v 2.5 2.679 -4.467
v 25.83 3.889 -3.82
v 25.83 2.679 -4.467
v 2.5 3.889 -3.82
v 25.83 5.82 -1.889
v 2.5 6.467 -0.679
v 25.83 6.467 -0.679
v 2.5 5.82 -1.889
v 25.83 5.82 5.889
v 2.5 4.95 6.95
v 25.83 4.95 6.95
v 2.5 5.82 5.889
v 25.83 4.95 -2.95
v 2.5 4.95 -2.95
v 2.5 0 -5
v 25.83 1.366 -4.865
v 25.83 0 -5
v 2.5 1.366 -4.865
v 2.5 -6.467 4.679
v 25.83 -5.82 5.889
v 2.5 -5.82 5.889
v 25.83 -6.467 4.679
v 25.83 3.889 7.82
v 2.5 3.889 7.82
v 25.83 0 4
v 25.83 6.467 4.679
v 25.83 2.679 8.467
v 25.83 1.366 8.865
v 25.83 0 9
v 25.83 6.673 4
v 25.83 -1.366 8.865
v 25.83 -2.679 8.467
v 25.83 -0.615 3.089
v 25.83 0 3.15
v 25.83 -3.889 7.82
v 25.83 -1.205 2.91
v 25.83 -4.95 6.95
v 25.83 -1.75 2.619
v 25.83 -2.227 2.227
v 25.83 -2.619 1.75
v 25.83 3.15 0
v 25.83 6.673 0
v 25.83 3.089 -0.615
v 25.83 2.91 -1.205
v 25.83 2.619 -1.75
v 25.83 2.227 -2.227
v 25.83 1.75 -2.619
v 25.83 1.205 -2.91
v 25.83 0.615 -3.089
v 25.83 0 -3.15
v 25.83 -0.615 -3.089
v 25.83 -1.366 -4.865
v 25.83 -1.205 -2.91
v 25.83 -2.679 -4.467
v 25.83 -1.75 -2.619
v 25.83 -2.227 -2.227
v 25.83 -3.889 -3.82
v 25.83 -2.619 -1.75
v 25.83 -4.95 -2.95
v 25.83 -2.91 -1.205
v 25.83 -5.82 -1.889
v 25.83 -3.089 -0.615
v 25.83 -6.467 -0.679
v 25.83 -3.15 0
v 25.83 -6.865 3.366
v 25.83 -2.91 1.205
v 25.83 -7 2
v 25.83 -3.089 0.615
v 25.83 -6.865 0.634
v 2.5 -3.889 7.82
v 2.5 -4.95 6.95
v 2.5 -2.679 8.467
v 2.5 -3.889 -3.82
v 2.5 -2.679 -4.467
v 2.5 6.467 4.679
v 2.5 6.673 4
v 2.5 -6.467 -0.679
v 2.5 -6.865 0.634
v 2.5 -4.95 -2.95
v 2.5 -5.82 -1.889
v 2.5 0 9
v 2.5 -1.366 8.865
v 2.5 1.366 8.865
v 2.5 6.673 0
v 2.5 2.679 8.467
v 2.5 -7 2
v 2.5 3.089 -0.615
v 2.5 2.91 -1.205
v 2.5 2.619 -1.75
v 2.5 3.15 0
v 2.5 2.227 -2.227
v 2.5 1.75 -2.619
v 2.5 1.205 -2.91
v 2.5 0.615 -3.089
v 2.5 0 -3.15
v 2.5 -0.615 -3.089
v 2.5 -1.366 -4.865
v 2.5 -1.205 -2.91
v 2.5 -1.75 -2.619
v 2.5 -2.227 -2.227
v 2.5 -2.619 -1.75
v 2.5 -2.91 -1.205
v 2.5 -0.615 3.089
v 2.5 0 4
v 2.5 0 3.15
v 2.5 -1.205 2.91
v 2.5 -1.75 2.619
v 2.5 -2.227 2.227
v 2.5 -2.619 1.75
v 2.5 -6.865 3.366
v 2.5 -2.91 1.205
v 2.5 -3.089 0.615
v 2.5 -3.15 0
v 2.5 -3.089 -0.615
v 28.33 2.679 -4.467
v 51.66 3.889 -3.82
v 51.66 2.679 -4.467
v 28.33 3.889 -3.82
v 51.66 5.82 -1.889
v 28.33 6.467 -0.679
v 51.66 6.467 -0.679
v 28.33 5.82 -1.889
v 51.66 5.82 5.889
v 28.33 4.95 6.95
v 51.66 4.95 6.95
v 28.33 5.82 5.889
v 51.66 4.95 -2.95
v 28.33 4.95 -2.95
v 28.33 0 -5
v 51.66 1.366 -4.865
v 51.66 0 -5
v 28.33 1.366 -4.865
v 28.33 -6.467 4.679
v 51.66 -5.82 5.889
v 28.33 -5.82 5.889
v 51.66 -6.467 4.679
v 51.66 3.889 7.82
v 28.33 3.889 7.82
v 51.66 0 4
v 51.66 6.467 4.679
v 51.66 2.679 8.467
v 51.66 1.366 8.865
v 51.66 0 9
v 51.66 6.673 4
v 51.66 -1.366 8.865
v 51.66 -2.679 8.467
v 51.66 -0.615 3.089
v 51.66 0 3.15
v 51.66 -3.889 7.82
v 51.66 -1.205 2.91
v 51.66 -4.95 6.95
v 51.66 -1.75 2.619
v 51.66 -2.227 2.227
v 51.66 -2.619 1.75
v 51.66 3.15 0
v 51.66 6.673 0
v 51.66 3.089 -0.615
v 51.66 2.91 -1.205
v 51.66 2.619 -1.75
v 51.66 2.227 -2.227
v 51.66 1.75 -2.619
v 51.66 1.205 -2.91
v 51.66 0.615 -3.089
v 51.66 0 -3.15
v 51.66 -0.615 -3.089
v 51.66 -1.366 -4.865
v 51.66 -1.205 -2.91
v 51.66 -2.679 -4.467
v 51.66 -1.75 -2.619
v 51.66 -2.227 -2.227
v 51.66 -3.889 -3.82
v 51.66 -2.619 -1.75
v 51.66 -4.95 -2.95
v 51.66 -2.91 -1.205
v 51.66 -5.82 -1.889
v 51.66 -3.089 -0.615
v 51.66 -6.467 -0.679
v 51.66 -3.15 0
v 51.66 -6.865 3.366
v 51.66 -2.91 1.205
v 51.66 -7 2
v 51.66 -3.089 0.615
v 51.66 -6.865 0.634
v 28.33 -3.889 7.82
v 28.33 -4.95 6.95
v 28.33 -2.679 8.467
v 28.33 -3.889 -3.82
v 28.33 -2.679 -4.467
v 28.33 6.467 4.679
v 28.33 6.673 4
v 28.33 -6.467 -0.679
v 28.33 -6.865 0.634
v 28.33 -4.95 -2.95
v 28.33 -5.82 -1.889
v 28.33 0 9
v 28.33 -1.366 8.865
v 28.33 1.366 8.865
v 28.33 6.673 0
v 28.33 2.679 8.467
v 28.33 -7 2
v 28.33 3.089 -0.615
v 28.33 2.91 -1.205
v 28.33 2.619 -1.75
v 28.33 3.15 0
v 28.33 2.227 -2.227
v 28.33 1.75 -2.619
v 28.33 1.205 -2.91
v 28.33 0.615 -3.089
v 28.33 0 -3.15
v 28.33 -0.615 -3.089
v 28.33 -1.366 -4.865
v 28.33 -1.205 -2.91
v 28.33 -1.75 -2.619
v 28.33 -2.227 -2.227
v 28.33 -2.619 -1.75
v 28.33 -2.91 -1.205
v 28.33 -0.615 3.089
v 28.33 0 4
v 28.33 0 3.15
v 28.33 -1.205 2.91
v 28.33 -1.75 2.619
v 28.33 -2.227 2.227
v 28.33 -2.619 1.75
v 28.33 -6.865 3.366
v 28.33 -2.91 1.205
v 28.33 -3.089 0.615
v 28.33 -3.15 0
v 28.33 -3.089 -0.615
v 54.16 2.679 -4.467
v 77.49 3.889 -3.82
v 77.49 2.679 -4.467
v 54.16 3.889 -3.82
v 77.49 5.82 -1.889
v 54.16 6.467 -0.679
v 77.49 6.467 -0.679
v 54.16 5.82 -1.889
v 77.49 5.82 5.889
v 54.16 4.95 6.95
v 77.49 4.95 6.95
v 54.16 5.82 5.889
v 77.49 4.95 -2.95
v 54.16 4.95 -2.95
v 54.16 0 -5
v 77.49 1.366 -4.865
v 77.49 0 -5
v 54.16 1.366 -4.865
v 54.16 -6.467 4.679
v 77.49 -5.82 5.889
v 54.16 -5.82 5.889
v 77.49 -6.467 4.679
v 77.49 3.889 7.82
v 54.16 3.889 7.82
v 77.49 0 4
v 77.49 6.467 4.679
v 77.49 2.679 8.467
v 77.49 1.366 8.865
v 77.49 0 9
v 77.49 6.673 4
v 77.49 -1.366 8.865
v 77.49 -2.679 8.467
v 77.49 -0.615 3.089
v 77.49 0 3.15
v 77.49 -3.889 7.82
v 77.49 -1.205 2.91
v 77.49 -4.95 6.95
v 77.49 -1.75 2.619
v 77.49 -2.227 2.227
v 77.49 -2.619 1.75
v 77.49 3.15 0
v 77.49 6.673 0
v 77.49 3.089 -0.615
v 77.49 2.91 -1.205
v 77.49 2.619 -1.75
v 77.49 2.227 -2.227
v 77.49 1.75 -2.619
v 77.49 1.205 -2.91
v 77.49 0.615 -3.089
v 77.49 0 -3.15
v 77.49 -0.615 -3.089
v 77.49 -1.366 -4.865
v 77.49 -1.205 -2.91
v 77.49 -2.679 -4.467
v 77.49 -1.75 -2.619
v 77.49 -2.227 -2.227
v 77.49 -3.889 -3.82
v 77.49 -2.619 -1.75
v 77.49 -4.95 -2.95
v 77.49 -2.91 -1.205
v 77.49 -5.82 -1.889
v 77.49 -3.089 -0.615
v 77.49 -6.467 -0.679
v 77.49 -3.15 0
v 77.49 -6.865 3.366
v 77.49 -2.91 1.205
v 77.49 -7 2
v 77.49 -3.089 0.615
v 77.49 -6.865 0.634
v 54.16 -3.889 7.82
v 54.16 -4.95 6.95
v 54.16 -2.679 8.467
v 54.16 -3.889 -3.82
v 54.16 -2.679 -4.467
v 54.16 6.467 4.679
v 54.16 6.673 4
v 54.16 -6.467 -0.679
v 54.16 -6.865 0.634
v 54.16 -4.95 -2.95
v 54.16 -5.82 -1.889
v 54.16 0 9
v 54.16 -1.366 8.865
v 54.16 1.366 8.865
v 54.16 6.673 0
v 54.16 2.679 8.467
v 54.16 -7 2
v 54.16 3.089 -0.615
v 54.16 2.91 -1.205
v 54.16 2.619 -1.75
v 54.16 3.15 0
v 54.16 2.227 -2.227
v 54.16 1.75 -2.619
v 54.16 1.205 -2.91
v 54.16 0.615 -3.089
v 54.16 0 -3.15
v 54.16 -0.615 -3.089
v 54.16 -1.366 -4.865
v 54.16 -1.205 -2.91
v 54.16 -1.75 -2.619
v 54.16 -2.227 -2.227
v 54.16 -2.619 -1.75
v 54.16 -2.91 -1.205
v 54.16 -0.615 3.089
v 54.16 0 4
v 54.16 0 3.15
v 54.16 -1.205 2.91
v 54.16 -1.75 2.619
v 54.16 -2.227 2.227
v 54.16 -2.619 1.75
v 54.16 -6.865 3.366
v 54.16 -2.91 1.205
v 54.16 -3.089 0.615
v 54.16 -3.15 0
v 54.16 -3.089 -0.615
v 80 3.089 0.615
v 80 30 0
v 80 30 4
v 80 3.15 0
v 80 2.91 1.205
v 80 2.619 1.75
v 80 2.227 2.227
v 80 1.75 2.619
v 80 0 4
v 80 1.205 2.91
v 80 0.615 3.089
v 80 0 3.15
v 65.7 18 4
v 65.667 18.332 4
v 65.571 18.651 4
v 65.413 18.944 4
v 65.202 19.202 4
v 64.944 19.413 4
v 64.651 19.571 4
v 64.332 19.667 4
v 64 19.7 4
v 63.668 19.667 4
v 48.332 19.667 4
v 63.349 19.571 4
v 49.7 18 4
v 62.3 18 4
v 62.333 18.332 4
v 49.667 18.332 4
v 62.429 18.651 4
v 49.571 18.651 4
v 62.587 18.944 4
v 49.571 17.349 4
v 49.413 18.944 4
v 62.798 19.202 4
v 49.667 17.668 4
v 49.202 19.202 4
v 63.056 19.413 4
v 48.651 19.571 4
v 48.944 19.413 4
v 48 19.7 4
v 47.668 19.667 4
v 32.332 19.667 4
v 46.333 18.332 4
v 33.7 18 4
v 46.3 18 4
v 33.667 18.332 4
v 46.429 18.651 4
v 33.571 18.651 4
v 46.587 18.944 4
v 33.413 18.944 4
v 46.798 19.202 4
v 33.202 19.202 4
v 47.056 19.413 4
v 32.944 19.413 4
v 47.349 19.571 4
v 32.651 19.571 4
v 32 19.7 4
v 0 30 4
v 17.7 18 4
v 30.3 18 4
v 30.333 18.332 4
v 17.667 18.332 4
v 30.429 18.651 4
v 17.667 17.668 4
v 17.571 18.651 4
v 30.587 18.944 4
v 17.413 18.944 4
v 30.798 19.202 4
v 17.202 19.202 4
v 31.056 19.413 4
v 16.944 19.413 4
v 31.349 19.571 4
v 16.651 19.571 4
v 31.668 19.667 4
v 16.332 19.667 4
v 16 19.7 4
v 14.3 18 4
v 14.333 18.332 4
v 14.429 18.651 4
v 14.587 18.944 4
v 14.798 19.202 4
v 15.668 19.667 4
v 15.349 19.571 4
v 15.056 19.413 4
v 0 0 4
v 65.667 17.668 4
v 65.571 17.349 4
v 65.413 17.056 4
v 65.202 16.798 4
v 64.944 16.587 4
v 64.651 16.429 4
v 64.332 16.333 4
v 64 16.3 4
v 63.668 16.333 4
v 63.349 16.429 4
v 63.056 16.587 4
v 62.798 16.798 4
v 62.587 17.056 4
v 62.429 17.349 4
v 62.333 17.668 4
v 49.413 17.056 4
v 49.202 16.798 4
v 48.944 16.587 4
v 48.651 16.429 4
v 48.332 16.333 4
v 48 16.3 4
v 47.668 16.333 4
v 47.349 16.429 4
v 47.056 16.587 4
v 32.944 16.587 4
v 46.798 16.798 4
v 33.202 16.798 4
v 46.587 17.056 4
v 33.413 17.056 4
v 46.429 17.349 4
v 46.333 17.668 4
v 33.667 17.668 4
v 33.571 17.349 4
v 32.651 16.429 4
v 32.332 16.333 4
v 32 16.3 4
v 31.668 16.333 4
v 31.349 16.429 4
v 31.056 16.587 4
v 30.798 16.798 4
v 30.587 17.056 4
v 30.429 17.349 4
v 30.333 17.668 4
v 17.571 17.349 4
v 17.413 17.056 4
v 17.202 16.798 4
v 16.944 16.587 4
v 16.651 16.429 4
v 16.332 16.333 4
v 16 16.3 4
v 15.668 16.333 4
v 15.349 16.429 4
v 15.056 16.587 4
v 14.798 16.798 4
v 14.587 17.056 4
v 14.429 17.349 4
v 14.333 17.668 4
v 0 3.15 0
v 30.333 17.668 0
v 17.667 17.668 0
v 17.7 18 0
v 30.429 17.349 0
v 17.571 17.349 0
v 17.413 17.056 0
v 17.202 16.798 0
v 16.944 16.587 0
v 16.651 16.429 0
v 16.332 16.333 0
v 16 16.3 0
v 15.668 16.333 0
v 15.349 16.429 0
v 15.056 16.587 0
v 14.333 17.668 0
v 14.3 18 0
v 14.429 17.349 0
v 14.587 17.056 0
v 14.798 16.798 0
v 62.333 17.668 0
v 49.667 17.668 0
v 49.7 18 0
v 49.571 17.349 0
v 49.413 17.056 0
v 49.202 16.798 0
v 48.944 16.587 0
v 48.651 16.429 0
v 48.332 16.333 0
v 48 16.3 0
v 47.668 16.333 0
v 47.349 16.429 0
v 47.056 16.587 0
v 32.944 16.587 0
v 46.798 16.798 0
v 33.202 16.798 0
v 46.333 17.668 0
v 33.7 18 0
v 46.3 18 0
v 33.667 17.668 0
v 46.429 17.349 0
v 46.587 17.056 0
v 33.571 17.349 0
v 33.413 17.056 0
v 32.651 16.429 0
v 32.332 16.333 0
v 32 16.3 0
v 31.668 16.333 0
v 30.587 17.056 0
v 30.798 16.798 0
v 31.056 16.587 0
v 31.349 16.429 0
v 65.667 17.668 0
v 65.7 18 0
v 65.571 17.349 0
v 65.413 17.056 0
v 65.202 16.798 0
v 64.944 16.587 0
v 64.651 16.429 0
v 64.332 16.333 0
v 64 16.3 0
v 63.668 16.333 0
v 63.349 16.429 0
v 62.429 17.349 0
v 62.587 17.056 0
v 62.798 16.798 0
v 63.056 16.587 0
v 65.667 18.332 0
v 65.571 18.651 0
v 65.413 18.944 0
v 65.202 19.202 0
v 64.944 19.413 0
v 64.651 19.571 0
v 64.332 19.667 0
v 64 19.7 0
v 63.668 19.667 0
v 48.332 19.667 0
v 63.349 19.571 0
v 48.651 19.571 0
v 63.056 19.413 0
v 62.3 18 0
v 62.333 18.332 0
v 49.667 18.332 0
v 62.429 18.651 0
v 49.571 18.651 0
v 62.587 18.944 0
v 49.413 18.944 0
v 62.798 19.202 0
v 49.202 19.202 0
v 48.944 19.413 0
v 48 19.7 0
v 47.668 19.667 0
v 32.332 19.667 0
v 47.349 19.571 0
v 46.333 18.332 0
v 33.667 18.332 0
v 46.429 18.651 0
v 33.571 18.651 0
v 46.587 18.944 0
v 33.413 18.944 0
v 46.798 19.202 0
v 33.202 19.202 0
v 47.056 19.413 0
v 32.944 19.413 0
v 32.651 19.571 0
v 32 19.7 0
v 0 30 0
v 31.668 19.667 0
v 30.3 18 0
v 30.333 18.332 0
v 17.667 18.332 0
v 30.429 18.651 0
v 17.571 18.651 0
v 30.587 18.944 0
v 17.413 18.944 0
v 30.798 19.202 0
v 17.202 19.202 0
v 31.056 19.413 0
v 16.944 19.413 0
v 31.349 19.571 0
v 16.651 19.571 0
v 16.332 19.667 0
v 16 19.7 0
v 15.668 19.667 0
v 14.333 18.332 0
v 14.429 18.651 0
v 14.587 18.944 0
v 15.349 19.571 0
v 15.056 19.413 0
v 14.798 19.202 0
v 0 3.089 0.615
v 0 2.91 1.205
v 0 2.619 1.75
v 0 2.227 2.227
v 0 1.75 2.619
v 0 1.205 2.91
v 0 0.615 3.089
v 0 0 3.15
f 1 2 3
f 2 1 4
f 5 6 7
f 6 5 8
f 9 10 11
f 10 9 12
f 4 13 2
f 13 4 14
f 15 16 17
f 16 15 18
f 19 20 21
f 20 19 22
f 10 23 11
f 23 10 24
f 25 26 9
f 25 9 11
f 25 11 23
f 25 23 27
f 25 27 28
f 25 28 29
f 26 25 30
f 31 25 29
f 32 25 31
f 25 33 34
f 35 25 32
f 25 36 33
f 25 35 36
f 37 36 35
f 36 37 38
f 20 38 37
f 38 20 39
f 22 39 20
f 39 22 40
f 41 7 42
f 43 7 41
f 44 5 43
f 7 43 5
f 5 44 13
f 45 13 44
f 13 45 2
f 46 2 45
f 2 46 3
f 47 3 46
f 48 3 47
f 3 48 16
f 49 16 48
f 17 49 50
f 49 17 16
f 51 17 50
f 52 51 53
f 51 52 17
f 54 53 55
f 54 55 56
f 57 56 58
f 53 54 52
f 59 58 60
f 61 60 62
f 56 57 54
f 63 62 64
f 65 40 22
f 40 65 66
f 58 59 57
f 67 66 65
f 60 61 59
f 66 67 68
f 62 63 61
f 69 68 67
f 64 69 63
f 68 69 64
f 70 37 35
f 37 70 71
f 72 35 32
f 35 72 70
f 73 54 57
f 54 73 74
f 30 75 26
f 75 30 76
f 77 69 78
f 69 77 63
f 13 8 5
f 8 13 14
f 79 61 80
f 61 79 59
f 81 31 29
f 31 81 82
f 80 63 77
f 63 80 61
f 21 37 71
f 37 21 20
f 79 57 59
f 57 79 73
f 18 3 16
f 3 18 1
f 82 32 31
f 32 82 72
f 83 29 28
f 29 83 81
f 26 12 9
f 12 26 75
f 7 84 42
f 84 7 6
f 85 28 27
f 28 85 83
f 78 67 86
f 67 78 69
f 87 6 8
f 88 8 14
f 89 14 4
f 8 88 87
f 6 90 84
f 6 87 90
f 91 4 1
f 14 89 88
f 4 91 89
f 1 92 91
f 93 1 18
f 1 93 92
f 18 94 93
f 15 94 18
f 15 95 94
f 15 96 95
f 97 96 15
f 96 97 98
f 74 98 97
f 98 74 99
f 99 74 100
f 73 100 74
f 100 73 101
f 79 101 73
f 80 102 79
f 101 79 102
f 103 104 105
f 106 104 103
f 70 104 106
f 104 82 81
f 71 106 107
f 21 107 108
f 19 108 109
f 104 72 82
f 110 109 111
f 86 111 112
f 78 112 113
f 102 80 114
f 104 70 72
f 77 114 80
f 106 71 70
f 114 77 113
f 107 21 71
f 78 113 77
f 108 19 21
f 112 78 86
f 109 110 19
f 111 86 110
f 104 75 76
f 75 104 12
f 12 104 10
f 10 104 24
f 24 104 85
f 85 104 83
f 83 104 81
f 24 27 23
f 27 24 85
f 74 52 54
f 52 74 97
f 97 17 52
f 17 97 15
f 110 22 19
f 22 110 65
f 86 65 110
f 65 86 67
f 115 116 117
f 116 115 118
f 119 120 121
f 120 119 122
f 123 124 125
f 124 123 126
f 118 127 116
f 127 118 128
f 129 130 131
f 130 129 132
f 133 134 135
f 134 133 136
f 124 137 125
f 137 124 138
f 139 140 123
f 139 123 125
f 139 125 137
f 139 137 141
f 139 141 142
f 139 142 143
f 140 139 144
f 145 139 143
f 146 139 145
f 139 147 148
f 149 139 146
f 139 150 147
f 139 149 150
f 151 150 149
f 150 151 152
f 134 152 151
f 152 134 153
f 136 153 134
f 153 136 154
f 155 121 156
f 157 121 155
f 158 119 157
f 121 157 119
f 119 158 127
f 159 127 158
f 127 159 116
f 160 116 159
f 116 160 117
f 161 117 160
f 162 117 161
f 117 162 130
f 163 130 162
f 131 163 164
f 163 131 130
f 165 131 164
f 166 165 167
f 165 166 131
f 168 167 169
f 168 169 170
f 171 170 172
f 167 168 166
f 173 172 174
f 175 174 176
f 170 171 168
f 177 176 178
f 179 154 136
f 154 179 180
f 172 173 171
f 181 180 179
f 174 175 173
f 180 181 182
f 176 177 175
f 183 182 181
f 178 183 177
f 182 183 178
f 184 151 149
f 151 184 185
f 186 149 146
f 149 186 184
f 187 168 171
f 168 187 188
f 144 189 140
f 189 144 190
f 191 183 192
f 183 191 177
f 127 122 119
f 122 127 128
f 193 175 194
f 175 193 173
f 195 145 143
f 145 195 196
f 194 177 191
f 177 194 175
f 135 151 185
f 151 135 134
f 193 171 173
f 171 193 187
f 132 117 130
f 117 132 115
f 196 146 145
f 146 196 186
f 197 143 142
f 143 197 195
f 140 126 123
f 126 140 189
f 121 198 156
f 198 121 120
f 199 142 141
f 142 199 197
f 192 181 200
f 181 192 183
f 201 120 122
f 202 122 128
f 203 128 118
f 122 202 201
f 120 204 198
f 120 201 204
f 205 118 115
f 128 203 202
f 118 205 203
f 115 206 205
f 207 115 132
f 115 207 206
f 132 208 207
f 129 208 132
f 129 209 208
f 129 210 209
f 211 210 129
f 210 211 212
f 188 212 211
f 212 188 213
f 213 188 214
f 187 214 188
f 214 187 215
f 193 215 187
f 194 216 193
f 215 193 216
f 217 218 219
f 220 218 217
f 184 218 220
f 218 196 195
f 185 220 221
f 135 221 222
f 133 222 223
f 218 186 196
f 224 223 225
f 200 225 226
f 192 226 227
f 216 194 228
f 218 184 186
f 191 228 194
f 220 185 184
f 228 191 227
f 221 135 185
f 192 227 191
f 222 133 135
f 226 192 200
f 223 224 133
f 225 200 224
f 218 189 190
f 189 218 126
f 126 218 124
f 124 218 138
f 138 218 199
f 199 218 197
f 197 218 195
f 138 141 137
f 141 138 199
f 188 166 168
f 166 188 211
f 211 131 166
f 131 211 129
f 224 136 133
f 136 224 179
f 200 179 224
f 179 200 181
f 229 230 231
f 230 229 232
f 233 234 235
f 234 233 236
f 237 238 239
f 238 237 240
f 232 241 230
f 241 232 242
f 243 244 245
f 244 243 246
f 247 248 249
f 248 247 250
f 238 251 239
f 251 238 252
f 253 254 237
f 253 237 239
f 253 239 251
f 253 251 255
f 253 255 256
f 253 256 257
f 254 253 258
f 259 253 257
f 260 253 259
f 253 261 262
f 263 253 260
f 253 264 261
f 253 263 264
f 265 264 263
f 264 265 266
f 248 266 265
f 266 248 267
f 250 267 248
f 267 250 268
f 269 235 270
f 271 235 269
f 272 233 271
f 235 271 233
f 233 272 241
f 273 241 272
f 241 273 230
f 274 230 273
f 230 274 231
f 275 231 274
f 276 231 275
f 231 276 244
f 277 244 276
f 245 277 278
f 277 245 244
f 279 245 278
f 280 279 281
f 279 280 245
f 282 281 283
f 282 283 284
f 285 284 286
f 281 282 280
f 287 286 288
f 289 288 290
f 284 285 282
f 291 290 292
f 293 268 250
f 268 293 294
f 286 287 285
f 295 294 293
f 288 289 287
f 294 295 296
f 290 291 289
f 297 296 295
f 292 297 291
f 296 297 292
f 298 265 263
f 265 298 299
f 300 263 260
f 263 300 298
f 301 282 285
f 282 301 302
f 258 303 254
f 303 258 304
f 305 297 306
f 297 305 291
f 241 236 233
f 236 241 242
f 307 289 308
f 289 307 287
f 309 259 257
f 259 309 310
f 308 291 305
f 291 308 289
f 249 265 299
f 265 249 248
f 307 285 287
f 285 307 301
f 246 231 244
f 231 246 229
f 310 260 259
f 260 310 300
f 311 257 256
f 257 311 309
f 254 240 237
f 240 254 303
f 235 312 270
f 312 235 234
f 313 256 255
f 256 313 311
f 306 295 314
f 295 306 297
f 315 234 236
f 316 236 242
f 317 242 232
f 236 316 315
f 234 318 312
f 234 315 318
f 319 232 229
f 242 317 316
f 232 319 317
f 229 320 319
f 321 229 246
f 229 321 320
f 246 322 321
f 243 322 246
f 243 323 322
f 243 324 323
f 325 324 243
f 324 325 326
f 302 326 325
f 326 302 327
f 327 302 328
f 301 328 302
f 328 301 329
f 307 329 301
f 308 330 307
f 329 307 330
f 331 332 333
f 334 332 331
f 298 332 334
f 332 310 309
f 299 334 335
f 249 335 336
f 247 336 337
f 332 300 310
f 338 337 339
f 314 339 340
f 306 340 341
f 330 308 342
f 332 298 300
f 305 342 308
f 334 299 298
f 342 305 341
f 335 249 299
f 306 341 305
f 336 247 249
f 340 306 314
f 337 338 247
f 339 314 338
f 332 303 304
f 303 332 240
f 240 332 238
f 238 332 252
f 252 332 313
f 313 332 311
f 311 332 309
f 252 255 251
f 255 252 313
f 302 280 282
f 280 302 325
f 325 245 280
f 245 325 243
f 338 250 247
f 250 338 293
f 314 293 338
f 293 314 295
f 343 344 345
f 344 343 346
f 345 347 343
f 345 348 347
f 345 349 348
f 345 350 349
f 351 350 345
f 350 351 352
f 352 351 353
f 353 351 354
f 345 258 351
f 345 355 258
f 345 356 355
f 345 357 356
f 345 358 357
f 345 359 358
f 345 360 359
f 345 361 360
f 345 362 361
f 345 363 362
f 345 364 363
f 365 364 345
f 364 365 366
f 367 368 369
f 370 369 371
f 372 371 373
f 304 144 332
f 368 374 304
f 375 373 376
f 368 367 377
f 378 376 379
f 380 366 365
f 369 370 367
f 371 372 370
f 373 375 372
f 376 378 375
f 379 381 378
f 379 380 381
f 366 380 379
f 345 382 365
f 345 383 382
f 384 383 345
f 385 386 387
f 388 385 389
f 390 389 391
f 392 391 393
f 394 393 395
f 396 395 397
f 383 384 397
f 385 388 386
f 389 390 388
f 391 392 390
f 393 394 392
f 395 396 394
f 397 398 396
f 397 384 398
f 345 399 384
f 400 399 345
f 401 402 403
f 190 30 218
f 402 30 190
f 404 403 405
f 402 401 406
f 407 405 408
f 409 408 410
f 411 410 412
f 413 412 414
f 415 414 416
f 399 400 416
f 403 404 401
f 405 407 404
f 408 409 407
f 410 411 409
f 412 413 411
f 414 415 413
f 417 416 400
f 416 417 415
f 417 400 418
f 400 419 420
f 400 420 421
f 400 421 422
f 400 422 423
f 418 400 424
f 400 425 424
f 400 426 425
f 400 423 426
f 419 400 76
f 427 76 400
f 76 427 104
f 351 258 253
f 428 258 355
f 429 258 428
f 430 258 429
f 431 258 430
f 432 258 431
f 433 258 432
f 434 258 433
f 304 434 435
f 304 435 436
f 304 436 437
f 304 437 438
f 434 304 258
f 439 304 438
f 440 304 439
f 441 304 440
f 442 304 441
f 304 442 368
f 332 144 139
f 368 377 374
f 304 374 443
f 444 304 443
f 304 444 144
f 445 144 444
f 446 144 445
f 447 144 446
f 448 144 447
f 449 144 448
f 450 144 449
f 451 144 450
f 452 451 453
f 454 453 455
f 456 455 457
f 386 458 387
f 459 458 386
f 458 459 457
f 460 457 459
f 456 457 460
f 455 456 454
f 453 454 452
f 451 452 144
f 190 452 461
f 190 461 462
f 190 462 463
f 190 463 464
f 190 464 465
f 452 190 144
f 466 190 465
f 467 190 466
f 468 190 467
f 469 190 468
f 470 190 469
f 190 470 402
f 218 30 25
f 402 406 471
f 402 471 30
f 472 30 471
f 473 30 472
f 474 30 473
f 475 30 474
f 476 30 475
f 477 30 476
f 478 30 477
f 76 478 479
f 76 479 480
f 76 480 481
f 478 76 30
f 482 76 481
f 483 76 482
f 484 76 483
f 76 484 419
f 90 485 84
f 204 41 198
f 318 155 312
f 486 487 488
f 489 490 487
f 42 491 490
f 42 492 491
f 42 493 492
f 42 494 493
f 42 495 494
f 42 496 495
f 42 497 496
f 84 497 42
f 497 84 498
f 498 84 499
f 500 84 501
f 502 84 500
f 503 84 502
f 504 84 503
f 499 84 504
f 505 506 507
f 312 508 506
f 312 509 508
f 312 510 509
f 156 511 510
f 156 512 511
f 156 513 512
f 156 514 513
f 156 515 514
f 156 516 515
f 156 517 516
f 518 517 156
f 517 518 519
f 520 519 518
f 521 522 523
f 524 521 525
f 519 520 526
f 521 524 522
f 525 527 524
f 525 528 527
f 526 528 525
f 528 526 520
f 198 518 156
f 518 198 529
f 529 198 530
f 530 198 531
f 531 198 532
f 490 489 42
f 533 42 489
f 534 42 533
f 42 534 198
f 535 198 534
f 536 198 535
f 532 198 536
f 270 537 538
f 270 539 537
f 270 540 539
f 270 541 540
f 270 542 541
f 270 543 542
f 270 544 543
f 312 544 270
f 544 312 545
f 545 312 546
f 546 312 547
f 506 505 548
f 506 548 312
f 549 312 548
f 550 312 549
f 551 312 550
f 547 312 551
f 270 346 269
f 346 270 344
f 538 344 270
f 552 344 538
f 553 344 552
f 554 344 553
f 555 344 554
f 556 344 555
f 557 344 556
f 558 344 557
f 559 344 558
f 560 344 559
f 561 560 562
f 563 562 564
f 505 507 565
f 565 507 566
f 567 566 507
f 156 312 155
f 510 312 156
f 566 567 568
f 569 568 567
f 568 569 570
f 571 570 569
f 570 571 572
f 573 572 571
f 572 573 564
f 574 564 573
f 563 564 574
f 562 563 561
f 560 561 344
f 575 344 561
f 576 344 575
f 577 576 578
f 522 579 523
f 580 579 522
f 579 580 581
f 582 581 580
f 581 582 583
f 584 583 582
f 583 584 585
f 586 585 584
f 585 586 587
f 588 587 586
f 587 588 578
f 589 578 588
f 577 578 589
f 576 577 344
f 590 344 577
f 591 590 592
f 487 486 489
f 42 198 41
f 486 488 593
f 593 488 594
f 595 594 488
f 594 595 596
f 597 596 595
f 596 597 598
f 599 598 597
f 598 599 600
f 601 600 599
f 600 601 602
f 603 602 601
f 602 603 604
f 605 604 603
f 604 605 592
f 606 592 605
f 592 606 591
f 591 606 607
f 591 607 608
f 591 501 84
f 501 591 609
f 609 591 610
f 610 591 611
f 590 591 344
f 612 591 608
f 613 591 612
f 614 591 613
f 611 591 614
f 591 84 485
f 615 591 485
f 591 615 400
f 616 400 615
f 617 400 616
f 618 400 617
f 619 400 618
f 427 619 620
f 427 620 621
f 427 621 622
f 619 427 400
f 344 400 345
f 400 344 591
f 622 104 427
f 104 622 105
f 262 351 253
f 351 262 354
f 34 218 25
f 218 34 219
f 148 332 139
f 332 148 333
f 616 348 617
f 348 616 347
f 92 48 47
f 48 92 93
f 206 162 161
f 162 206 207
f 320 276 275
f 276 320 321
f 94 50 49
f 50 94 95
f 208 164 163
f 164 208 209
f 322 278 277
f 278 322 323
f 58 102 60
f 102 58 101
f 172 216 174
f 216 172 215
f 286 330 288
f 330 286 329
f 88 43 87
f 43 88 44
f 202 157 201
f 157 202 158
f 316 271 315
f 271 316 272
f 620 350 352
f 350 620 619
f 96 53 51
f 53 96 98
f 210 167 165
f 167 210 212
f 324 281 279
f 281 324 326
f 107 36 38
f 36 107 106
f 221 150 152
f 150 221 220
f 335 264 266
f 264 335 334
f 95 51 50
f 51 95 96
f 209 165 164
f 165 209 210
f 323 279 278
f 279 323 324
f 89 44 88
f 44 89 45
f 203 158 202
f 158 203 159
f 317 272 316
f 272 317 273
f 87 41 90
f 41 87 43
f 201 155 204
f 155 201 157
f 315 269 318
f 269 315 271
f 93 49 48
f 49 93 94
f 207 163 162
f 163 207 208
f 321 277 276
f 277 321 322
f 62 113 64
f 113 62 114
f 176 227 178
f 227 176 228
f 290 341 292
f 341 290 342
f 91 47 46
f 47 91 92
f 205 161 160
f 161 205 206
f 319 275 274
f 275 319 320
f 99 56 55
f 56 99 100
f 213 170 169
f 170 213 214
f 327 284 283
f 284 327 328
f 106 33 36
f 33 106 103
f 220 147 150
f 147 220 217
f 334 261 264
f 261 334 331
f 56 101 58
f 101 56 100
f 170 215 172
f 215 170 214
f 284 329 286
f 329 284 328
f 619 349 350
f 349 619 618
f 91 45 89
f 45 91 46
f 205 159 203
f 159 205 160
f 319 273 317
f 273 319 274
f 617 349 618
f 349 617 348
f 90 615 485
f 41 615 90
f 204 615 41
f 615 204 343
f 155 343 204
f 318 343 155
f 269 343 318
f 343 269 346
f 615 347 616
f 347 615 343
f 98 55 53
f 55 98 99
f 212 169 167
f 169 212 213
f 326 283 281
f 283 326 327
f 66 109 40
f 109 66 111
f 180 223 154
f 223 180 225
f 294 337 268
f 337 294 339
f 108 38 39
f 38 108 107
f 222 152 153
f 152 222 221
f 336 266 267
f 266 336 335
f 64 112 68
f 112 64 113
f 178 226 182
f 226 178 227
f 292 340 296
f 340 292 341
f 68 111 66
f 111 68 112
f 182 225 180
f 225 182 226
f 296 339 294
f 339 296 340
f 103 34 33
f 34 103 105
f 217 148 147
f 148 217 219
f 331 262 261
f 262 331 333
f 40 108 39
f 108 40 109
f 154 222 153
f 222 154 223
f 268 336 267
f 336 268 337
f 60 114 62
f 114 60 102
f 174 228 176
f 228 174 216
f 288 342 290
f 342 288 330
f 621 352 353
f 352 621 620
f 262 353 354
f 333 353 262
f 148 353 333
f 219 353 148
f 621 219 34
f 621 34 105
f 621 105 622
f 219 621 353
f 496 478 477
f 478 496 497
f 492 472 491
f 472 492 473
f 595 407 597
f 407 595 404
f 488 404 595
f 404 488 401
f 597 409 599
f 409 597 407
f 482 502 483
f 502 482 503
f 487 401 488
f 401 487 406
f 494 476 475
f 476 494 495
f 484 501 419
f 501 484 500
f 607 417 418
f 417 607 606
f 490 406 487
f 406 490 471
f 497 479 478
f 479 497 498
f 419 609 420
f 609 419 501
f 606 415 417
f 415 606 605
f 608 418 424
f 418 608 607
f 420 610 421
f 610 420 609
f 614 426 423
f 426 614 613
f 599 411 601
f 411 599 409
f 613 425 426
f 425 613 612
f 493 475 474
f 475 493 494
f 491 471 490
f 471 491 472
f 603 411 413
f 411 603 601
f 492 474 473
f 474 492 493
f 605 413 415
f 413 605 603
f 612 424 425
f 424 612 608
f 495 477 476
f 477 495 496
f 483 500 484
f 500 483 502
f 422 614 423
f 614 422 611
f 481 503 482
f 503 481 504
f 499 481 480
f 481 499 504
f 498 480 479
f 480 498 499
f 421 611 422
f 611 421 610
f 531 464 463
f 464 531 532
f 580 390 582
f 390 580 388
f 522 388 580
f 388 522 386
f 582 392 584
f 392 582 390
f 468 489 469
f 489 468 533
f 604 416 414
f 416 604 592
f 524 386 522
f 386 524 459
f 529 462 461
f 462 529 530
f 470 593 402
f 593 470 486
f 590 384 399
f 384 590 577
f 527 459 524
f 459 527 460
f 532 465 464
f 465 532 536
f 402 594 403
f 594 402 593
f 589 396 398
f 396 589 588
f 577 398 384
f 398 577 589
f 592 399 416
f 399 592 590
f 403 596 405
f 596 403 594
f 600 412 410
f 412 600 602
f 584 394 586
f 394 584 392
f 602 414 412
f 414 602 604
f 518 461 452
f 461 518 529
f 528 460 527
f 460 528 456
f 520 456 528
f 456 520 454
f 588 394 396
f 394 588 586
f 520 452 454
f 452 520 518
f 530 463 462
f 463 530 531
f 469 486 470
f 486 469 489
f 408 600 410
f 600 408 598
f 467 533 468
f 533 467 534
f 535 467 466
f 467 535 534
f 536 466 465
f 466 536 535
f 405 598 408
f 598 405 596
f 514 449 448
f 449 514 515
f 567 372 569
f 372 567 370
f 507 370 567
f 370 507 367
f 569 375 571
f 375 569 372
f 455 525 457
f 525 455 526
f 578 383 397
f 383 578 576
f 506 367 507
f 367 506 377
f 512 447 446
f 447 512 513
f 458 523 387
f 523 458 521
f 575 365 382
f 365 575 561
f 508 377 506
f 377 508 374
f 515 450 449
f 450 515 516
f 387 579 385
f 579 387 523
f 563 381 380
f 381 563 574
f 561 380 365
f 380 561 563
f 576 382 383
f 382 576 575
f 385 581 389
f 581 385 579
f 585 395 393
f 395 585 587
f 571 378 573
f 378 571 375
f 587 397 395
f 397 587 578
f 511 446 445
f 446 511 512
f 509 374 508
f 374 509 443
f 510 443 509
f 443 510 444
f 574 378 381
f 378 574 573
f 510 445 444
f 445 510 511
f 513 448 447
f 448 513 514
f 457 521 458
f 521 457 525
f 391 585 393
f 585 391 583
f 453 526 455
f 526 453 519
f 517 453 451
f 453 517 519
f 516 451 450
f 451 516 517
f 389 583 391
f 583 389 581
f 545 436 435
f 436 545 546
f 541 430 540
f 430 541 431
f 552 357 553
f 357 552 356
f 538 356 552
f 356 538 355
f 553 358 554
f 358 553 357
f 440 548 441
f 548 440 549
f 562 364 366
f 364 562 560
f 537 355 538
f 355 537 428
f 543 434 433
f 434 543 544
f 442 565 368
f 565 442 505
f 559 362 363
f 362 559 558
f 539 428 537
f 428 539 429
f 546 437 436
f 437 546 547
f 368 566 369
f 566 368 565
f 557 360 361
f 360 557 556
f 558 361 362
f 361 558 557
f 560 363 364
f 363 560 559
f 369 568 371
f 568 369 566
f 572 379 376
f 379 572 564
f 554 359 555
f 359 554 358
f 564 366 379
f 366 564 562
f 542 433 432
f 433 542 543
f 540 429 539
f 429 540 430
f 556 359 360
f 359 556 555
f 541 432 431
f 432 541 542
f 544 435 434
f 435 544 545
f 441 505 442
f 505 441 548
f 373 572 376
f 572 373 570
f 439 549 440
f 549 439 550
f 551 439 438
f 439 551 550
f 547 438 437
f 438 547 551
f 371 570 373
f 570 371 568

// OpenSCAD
$fn = 32;

// ----------------------------------------------------------------------
// Hinge leaf: 80 x 37 x 14 mm
// ----------------------------------------------------------------------

// --- parameters (mm) ---
plate_len = 80;           // leaf length, X
plate_w = 30;             // leaf width, Y
plate_t = 4;              // leaf thickness
barrel_d = 14;            // knuckle diameter
barrel_w = 23.33;         // knuckle width
knuckle_n = 3;            // number of knuckles
pin_d = 6.3;              // pin bore
gap = 2.5;                // gap between the knuckles
screw_d = 3.4;            // screw clearance

module leaf() {
  cube([plate_len, plate_w, plate_t]);
}

module knuckles() {
  /* barrels sit on the leaf edge, the pin axis at half the leaf thickness */
  for (i = [0 : knuckle_n - 1])
    translate([gap + i * (barrel_w + gap), 0, plate_t * 0.5])
      rotate([0, 90, 0]) cylinder(h = barrel_w, d = barrel_d);
}

difference() {
  union() {
    leaf();
    knuckles();
  }
  rotate([0, 90, 0]) translate([0, 0, -1])
    cylinder(h = plate_len + 2, d = pin_d);
  translate([16, plate_w * 0.6, -1]) cylinder(h = plate_t + 2, d = screw_d);
  translate([32, plate_w * 0.6, -1]) cylinder(h = plate_t + 2, d = screw_d);
  translate([48, plate_w * 0.6, -1]) cylinder(h = plate_t + 2, d = screw_d);
  translate([64, plate_w * 0.6, -1]) cylinder(h = plate_t + 2, d = screw_d);
}
